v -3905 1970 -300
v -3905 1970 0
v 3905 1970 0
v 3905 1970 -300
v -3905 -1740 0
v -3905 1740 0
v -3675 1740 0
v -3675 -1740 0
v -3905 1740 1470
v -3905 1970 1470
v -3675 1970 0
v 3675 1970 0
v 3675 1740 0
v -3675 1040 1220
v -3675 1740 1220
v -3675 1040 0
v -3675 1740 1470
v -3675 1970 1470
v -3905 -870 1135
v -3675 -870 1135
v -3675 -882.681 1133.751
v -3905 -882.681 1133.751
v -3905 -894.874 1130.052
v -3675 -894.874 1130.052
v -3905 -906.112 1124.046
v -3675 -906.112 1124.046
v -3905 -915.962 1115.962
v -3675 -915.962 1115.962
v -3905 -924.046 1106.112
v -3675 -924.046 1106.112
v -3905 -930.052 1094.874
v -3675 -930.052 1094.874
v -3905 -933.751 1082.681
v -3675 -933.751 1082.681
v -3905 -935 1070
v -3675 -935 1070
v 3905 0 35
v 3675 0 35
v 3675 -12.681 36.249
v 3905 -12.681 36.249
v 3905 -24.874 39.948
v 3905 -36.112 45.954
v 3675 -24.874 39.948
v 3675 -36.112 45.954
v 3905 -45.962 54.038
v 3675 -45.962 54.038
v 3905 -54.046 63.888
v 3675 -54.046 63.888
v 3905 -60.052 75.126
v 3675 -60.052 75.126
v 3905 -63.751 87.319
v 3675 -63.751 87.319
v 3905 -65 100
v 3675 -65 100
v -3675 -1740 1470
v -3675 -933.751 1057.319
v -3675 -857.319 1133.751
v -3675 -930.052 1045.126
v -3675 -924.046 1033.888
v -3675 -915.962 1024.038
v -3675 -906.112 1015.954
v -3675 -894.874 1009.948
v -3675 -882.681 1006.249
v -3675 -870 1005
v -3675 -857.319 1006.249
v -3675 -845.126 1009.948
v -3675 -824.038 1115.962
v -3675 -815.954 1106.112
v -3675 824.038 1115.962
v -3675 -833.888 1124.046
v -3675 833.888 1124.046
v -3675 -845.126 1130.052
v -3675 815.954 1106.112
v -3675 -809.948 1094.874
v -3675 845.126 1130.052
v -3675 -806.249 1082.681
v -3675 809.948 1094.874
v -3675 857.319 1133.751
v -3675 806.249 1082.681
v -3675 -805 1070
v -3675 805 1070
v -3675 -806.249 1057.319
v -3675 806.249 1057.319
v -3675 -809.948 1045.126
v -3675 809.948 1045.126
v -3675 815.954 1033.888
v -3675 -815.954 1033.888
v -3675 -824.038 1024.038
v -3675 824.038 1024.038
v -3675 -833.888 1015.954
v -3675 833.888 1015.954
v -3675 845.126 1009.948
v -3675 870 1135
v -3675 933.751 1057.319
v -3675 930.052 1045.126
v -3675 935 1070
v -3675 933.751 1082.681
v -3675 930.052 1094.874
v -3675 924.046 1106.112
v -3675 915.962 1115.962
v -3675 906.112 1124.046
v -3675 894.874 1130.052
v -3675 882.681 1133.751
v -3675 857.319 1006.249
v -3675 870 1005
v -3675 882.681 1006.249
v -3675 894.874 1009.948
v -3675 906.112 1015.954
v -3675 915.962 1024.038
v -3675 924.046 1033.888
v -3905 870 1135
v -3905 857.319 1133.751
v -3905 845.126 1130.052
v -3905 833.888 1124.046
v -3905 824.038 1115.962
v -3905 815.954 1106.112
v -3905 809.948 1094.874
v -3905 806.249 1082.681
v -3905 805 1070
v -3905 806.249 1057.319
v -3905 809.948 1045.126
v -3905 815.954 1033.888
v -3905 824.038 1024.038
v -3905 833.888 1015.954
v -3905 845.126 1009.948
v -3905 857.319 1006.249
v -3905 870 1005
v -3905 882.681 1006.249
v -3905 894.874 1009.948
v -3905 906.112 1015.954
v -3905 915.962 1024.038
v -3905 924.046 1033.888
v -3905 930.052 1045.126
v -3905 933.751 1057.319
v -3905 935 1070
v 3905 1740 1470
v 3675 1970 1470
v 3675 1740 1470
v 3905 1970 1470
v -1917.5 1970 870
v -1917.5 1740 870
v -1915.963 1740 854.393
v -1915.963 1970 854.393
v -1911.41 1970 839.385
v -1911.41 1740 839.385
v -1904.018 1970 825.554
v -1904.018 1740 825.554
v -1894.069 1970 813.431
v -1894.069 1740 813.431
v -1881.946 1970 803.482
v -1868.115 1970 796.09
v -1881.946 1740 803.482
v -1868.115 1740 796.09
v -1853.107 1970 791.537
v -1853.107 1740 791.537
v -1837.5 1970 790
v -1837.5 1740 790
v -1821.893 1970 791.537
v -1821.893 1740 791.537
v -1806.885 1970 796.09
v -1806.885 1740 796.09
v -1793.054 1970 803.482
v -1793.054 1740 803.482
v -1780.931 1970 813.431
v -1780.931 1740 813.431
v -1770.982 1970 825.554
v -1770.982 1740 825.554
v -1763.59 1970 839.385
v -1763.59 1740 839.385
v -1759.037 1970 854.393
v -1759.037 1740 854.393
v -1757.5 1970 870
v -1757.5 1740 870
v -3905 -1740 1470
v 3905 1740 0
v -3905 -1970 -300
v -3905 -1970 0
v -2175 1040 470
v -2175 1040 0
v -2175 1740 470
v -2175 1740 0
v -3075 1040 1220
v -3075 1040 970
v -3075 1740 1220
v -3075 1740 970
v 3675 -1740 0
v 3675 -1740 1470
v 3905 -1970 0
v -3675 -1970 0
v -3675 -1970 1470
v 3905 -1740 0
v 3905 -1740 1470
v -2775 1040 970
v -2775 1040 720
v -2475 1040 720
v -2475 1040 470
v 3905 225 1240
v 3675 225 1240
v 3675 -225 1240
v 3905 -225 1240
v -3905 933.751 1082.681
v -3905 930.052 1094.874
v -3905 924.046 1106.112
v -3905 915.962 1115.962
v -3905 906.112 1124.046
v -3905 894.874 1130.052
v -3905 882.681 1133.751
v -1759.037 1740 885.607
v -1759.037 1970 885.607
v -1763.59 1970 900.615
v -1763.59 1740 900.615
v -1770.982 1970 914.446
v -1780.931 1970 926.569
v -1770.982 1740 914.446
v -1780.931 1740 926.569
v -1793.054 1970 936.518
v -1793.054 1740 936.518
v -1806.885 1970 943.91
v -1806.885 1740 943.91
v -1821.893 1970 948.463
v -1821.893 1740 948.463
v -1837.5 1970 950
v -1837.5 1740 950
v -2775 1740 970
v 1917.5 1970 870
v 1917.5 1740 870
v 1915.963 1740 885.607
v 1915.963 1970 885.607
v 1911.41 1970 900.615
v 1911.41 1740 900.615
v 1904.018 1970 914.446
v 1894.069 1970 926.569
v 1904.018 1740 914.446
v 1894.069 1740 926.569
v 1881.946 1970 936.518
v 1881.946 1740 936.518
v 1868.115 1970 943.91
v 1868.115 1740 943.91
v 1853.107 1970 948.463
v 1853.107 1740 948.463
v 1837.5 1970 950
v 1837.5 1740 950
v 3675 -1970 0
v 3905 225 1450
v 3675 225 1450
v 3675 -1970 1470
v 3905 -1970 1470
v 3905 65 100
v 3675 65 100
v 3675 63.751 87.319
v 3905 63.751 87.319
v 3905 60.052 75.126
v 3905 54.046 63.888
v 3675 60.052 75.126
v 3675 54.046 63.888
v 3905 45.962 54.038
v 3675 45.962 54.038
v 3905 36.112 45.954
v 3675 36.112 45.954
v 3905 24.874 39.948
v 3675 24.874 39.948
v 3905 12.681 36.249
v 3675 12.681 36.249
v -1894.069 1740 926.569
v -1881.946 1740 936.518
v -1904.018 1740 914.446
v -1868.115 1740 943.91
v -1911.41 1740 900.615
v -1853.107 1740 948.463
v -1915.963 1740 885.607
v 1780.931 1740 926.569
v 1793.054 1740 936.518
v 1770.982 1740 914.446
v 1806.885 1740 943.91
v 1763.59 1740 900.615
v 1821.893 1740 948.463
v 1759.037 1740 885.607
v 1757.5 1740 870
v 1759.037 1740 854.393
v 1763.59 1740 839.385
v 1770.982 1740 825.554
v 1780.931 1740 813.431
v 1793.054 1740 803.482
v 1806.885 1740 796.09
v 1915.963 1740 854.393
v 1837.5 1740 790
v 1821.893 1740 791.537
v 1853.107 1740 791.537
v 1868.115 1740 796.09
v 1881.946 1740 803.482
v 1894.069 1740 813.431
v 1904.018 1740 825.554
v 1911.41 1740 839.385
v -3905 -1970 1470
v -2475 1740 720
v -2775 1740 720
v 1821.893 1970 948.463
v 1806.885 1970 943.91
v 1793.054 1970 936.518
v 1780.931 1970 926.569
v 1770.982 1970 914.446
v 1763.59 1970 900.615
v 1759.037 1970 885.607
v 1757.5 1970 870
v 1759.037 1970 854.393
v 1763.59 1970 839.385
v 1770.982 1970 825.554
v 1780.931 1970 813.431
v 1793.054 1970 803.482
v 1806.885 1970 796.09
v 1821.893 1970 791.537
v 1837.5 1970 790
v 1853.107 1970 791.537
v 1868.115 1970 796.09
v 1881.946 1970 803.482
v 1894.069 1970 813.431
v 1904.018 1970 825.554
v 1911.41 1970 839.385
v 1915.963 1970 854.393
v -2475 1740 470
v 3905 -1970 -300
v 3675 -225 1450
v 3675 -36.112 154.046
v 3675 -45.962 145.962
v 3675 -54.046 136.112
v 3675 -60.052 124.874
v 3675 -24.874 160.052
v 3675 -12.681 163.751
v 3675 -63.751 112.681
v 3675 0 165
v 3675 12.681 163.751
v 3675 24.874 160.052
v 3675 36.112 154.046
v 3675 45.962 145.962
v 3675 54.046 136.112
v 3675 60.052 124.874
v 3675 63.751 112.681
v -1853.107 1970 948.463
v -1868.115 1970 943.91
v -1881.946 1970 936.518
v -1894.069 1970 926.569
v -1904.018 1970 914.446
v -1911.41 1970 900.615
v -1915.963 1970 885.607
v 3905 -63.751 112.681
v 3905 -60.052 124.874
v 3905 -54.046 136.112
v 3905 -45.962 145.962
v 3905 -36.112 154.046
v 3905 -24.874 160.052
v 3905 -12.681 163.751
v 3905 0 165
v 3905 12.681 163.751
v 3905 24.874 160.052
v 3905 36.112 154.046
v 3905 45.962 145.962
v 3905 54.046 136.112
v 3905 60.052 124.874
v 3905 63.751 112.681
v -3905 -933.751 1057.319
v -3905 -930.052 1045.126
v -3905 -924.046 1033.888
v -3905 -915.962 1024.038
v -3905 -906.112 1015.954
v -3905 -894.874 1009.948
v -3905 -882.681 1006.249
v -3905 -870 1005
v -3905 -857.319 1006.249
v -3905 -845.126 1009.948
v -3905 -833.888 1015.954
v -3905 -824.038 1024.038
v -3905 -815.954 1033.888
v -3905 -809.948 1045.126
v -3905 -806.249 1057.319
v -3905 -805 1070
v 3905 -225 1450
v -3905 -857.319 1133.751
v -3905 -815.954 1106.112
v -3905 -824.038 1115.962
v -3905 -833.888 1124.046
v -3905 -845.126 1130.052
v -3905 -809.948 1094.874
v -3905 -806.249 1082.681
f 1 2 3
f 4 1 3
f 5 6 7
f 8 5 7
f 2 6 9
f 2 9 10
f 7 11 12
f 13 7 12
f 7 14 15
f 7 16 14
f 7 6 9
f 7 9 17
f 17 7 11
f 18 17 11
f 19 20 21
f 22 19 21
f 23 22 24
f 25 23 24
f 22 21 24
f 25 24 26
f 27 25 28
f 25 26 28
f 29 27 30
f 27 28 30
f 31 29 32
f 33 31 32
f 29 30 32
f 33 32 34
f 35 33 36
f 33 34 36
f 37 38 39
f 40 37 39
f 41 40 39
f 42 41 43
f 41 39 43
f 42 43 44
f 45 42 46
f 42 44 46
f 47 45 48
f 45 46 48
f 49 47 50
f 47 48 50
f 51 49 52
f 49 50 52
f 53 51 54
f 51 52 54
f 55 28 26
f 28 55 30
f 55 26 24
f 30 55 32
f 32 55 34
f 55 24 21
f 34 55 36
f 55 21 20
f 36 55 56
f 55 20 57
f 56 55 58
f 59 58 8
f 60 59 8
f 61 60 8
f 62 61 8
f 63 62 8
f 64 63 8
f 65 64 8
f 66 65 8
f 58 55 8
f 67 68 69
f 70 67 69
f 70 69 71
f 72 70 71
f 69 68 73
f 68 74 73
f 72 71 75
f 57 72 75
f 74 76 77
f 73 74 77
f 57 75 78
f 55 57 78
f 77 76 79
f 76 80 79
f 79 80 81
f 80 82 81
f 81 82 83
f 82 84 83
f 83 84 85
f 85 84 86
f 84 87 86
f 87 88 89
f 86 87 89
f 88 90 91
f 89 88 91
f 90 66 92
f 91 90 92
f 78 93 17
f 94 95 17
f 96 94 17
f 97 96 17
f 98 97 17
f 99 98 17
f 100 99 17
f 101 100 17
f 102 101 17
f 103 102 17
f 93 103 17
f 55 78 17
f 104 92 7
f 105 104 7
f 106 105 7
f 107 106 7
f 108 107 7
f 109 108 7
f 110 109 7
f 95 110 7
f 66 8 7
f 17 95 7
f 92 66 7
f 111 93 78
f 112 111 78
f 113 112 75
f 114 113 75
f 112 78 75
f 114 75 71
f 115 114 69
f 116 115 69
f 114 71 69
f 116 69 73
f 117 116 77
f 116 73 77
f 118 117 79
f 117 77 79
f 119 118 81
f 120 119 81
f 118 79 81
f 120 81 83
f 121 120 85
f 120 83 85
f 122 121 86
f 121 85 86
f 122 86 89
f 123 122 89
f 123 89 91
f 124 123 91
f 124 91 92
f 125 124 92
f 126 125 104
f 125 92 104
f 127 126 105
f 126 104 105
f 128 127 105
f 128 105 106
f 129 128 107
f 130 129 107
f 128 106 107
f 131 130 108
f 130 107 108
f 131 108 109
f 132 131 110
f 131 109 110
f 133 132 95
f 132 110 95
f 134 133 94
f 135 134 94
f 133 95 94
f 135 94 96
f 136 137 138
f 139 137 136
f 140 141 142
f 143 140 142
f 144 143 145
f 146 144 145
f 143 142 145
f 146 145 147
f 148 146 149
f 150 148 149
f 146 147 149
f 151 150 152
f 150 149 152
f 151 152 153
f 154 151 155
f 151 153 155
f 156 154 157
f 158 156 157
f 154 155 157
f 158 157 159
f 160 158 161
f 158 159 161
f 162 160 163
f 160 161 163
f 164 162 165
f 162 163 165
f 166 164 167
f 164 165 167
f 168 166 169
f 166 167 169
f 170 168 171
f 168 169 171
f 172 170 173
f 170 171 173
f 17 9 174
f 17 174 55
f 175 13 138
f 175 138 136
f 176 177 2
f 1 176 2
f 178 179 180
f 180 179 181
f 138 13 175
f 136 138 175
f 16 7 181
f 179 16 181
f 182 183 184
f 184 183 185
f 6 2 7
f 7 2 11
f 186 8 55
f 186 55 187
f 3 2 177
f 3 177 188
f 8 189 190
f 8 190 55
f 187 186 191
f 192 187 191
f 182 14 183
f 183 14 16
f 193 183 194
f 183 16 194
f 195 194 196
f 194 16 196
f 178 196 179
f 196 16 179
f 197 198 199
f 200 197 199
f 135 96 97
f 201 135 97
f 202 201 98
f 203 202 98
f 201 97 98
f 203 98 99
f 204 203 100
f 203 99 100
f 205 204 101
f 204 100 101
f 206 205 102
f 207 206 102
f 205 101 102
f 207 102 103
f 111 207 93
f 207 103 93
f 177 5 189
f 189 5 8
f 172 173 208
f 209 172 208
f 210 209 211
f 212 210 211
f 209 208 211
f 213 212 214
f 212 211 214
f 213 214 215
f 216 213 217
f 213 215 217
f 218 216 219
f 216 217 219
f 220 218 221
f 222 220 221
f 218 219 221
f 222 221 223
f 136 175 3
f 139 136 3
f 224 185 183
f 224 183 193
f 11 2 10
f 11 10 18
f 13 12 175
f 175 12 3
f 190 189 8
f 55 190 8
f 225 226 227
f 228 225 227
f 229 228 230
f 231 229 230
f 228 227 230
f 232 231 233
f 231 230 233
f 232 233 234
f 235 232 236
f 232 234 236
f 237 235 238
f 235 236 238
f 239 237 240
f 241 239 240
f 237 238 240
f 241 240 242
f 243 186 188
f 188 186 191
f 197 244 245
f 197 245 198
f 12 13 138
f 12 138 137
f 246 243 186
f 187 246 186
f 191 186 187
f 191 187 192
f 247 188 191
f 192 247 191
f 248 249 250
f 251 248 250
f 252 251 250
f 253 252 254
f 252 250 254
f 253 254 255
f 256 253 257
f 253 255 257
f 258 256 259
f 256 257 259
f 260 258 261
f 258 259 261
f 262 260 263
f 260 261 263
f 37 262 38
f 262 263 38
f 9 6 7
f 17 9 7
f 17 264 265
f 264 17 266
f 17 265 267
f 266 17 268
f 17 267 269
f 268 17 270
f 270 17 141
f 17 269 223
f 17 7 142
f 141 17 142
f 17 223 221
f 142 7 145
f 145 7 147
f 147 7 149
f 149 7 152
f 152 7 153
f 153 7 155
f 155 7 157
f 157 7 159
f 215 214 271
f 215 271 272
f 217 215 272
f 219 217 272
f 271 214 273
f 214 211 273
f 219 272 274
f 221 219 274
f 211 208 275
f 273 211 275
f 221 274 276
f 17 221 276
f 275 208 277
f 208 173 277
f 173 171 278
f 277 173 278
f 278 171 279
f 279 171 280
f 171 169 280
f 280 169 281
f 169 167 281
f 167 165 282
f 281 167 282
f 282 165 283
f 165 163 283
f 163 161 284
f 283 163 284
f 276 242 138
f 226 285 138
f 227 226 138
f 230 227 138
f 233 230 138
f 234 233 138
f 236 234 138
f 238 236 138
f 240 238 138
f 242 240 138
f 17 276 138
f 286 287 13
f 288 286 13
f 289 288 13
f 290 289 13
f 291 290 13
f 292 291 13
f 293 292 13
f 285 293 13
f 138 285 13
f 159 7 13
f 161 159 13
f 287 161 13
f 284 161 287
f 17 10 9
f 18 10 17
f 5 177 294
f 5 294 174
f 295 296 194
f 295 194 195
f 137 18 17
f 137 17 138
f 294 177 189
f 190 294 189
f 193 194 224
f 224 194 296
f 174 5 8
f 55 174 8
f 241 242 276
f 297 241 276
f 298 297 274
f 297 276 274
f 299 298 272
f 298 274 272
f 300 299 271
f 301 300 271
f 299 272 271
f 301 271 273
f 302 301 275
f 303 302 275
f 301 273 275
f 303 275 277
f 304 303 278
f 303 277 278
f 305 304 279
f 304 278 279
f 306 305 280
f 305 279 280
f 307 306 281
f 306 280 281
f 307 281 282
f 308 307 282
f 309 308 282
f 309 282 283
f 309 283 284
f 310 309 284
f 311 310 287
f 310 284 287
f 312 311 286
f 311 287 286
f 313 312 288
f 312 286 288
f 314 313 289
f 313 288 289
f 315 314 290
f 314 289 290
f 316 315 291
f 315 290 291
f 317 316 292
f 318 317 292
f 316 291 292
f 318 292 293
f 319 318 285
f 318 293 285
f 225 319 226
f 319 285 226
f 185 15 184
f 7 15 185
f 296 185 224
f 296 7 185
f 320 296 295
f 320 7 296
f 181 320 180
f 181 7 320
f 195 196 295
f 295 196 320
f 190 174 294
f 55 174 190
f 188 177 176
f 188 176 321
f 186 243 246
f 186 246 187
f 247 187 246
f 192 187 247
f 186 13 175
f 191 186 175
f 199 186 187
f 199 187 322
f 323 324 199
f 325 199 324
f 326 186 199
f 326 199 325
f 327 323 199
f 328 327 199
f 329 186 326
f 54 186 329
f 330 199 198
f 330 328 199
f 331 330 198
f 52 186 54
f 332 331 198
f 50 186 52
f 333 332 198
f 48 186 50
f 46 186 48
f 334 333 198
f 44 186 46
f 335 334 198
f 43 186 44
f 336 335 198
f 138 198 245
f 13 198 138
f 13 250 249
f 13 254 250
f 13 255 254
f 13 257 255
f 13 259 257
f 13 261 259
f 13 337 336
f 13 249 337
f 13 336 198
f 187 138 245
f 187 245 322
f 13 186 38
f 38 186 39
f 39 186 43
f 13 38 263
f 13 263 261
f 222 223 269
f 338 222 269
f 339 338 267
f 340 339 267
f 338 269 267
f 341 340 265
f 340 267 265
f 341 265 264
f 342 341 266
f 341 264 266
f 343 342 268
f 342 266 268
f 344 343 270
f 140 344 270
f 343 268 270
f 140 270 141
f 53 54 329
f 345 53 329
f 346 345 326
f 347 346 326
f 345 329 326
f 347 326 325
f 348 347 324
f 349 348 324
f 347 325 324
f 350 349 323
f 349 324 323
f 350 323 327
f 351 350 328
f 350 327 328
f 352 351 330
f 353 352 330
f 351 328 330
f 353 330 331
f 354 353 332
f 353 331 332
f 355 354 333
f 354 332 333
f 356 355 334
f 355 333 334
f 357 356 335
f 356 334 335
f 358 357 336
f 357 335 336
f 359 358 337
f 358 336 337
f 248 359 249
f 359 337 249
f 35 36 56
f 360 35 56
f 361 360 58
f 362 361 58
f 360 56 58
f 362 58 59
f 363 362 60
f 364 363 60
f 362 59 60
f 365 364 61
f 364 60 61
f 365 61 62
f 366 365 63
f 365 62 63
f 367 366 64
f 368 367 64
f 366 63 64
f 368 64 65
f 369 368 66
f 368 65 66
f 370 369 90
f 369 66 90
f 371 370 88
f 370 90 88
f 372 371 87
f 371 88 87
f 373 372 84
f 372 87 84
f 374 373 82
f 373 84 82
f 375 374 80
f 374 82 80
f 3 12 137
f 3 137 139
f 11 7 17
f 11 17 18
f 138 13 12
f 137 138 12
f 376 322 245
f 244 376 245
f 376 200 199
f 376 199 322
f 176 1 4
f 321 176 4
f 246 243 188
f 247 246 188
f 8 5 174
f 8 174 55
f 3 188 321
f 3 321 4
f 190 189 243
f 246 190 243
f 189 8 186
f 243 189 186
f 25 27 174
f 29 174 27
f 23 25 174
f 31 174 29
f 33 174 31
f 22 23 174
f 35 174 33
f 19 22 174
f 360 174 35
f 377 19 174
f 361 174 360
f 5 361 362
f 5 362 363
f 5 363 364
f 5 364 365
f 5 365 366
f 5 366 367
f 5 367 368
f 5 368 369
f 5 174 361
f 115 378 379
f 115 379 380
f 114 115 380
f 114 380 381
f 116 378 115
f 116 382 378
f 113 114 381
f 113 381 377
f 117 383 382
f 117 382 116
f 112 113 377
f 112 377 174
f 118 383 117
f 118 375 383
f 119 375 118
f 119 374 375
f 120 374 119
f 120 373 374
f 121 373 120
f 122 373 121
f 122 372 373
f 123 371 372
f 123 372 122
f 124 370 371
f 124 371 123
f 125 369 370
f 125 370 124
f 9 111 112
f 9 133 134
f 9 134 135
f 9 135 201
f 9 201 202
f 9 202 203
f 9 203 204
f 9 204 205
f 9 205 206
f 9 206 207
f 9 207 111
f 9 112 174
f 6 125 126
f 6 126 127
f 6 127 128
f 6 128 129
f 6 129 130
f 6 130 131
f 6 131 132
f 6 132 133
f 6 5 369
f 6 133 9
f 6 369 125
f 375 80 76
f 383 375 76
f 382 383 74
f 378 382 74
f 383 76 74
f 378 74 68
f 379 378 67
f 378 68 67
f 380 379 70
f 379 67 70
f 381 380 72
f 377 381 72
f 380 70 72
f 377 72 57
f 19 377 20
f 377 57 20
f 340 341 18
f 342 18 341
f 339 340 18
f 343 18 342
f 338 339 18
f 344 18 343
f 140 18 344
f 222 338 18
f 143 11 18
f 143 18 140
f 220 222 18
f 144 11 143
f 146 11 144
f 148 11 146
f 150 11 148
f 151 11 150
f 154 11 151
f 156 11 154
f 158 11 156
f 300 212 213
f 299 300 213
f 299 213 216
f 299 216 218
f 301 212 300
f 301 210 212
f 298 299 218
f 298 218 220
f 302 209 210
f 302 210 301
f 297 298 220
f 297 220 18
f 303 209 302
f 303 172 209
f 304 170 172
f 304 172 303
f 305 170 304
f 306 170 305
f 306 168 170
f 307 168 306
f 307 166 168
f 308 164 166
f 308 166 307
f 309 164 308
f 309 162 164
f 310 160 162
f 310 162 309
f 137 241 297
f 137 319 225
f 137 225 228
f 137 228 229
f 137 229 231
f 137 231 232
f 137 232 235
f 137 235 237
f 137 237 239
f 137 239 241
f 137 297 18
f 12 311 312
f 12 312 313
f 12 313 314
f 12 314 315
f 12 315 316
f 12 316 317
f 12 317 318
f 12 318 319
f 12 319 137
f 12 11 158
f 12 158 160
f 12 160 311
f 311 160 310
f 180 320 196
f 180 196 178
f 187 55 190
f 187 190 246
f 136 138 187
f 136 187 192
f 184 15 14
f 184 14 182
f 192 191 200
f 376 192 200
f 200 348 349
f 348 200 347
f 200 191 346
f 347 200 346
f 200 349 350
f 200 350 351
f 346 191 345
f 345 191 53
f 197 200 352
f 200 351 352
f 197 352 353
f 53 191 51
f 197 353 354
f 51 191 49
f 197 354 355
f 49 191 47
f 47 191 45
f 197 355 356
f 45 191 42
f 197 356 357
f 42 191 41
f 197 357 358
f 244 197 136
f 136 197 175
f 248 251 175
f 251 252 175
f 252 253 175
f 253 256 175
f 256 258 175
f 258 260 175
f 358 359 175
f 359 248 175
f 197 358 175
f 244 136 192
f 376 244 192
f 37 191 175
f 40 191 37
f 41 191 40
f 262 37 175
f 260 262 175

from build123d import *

# Parameters (mm, degrees)
F0_W      = 7810
F0_H      = 3940
F1_DEPTH  = 300
F2_W      = 230
F2_H      = 3480
F3_DEPTH  = 1470
F2_W_2    = 7350
F2_H_2    = 230
F4_DEPTH  = 1470
F5_W      = 1500
F5_H      = 700
F6_DEPTH  = 470
F7_W      = 1200
F7_H      = 700
F8_DEPTH  = 250
F9_W      = 900
F9_H      = 700
F10_DEPTH = 250
F11_W     = 600
F11_H     = 700
F12_DEPTH = 250
F14_DEPTH = 230
F16_DEPTH = 230
F17_W     = 225
F17_H     = 105
F18_DEPTH = 230


with BuildPart() as f1:
    # F0 (on Top) → F1 (new body)
    with BuildSketch(Plane.XY):
        Rectangle(F0_W, F0_H)
    extrude(amount=-F1_DEPTH)


with BuildPart() as f3:
    # F2 (on face) → F3 (new body)
    with BuildSketch(Plane.XY):
        with Locations((-3790, 0)):
            Rectangle(F2_W, F2_H)
    extrude(amount=F3_DEPTH)

    # F15 (on face) → F16 (cut)
    with BuildSketch(Plane.YZ.offset(-3675)):
        with BuildLine():
            Line((-870, 1070), (-870, 1135))
            ThreePointArc((-870, 1135), (-915.9619407771, 1115.9619407771), (-935, 1070))
            Line((-935, 1070), (-870, 1070))
        make_face()
        with BuildLine():
            ThreePointArc((-805, 1070), (-824.0380592229, 1115.9619407771), (-870, 1135))
            Line((-870, 1135), (-870, 1070))
            Line((-870, 1070), (-935, 1070))
            ThreePointArc((-935, 1070), (-870, 1005), (-805, 1070))
        make_face()
        with BuildLine():
            ThreePointArc((935, 1070), (915.9619407771, 1115.9619407771), (870, 1135))
            Line((870, 1135), (870, 1070))
            Line((870, 1070), (935, 1070))
        make_face()
        with BuildLine():
            Line((870, 1070), (870, 1135))
            ThreePointArc((870, 1135), (824.0380592229, 1024.0380592229), (935, 1070))
            Line((935, 1070), (870, 1070))
        make_face()
    extrude(amount=-F16_DEPTH, mode=Mode.SUBTRACT)


with BuildPart() as f3b:
    # F2 (on face) → F3, piece 2 (new body)
    with BuildSketch(Plane.XY):
        with Locations((3790, 0)):
            Rectangle(F2_W, F2_H)
    extrude(amount=F3_DEPTH)

    # F17 (on face) → F18 (cut)
    with BuildSketch(Plane(origin=(3675, 0, 0), x_dir=(0, -1, 0), z_dir=(-1, 0, 0))):
        with BuildLine():
            ThreePointArc((-65, 100), (-45.9619407771, 54.0380592229), (0, 35))
            Line((0, 35), (0, 100))
            Line((0, 100), (-65, 100))
        make_face()
        with BuildLine():
            Line((0, 100), (0, 35))
            ThreePointArc((0, 35), (45.9619407771, 54.0380592229), (65, 100))
            ThreePointArc((65, 100), (0, 165), (-65, 100))
            Line((-65, 100), (0, 100))
        make_face()
        Polygon((0, 1345), (-225, 1345), (-225, 1240), (225, 1240), (225, 1450), (0, 1450), align=None)
        with Locations((-112.5, 1397.5)):
            Rectangle(F17_W, F17_H)
    extrude(amount=-F18_DEPTH, mode=Mode.SUBTRACT)


with BuildPart() as f3c:
    # F2 (on face) → F3, piece 3 (new body)
    with BuildSketch(Plane.XY):
        with Locations((0, 1855)):
            Rectangle(F2_W_2, F2_H_2)
    extrude(amount=F3_DEPTH)

    # F13 (on face) → F14 (cut)
    with BuildSketch(Plane.XZ.offset(-1740)):
        with BuildLine():
            Line((-1837.5, 870), (-1837.5, 950))
            ThreePointArc((-1837.5, 950), (-1894.0685424949, 926.5685424949), (-1917.5, 870))
            Line((-1917.5, 870), (-1837.5, 870))
        make_face()
        with BuildLine():
            ThreePointArc((-1757.5, 870), (-1780.9314575051, 926.5685424949), (-1837.5, 950))
            Line((-1837.5, 950), (-1837.5, 870))
            Line((-1837.5, 870), (-1917.5, 870))
            ThreePointArc((-1917.5, 870), (-1837.5, 790), (-1757.5, 870))
        make_face()
        with BuildLine():
            ThreePointArc((1917.5, 870), (1894.0685424949, 926.5685424949), (1837.5, 950))
            Line((1837.5, 950), (1837.5, 870))
            Line((1837.5, 870), (1917.5, 870))
        make_face()
        with BuildLine():
            Line((1837.5, 870), (1837.5, 950))
            ThreePointArc((1837.5, 950), (1780.9314575051, 813.4314575051), (1917.5, 870))
            Line((1917.5, 870), (1837.5, 870))
        make_face()
    extrude(amount=-F14_DEPTH, mode=Mode.SUBTRACT)


with BuildPart() as f3d:
    # F2 (on face) → F3, piece 4 (new body)
    with BuildSketch(Plane.XY):
        with Locations((0, -1855)):
            Rectangle(F2_W_2, F2_H_2)
    extrude(amount=F3_DEPTH)


with BuildPart() as f4:
    # F2 (on face) → F4 (new body)
    with BuildSketch(Plane.XY):
        with Locations((-3790, -1855)):
            Rectangle(F2_W, F2_H_2)
    extrude(amount=F4_DEPTH)


with BuildPart() as f4b:
    # F2 (on face) → F4, piece 2 (new body)
    with BuildSketch(Plane.XY):
        with Locations((-3790, 1855)):
            Rectangle(F2_W, F2_H_2)
    extrude(amount=F4_DEPTH)


with BuildPart() as f4c:
    # F2 (on face) → F4, piece 3 (new body)
    with BuildSketch(Plane.XY):
        with Locations((3790, 1855)):
            Rectangle(F2_W, F2_H_2)
    extrude(amount=F4_DEPTH)


with BuildPart() as f4d:
    # F2 (on face) → F4, piece 4 (new body)
    with BuildSketch(Plane.XY):
        with Locations((3790, -1855)):
            Rectangle(F2_W, F2_H_2)
    extrude(amount=F4_DEPTH)


with BuildPart() as f6:
    # F5 (on face) → F6 (new body)
    with BuildSketch(Plane.XY):
        with Locations((-2925, 1390)):
            Rectangle(F5_W, F5_H)
    extrude(amount=F6_DEPTH)

    # F7 (on face) → F8 (join)
    with BuildSketch(Plane.XY.offset(470)):
        with Locations((-3075, 1390)):
            Rectangle(F7_W, F7_H)
    extrude(amount=F8_DEPTH)

    # F9 (on face) → F10 (join)
    with BuildSketch(Plane.XY.offset(720)):
        with Locations((-3225, 1390)):
            Rectangle(F9_W, F9_H)
    extrude(amount=F10_DEPTH)

    # F11 (on face) → F12 (join)
    with BuildSketch(Plane.XY.offset(970)):
        with Locations((-3375, 1390)):
            Rectangle(F11_W, F11_H)
    extrude(amount=F12_DEPTH)


solid = Compound([f1.part, f3.part, f3b.part, f3c.part, f3d.part, f4.part, f4b.part, f4c.part, f4d.part, f6.part])
